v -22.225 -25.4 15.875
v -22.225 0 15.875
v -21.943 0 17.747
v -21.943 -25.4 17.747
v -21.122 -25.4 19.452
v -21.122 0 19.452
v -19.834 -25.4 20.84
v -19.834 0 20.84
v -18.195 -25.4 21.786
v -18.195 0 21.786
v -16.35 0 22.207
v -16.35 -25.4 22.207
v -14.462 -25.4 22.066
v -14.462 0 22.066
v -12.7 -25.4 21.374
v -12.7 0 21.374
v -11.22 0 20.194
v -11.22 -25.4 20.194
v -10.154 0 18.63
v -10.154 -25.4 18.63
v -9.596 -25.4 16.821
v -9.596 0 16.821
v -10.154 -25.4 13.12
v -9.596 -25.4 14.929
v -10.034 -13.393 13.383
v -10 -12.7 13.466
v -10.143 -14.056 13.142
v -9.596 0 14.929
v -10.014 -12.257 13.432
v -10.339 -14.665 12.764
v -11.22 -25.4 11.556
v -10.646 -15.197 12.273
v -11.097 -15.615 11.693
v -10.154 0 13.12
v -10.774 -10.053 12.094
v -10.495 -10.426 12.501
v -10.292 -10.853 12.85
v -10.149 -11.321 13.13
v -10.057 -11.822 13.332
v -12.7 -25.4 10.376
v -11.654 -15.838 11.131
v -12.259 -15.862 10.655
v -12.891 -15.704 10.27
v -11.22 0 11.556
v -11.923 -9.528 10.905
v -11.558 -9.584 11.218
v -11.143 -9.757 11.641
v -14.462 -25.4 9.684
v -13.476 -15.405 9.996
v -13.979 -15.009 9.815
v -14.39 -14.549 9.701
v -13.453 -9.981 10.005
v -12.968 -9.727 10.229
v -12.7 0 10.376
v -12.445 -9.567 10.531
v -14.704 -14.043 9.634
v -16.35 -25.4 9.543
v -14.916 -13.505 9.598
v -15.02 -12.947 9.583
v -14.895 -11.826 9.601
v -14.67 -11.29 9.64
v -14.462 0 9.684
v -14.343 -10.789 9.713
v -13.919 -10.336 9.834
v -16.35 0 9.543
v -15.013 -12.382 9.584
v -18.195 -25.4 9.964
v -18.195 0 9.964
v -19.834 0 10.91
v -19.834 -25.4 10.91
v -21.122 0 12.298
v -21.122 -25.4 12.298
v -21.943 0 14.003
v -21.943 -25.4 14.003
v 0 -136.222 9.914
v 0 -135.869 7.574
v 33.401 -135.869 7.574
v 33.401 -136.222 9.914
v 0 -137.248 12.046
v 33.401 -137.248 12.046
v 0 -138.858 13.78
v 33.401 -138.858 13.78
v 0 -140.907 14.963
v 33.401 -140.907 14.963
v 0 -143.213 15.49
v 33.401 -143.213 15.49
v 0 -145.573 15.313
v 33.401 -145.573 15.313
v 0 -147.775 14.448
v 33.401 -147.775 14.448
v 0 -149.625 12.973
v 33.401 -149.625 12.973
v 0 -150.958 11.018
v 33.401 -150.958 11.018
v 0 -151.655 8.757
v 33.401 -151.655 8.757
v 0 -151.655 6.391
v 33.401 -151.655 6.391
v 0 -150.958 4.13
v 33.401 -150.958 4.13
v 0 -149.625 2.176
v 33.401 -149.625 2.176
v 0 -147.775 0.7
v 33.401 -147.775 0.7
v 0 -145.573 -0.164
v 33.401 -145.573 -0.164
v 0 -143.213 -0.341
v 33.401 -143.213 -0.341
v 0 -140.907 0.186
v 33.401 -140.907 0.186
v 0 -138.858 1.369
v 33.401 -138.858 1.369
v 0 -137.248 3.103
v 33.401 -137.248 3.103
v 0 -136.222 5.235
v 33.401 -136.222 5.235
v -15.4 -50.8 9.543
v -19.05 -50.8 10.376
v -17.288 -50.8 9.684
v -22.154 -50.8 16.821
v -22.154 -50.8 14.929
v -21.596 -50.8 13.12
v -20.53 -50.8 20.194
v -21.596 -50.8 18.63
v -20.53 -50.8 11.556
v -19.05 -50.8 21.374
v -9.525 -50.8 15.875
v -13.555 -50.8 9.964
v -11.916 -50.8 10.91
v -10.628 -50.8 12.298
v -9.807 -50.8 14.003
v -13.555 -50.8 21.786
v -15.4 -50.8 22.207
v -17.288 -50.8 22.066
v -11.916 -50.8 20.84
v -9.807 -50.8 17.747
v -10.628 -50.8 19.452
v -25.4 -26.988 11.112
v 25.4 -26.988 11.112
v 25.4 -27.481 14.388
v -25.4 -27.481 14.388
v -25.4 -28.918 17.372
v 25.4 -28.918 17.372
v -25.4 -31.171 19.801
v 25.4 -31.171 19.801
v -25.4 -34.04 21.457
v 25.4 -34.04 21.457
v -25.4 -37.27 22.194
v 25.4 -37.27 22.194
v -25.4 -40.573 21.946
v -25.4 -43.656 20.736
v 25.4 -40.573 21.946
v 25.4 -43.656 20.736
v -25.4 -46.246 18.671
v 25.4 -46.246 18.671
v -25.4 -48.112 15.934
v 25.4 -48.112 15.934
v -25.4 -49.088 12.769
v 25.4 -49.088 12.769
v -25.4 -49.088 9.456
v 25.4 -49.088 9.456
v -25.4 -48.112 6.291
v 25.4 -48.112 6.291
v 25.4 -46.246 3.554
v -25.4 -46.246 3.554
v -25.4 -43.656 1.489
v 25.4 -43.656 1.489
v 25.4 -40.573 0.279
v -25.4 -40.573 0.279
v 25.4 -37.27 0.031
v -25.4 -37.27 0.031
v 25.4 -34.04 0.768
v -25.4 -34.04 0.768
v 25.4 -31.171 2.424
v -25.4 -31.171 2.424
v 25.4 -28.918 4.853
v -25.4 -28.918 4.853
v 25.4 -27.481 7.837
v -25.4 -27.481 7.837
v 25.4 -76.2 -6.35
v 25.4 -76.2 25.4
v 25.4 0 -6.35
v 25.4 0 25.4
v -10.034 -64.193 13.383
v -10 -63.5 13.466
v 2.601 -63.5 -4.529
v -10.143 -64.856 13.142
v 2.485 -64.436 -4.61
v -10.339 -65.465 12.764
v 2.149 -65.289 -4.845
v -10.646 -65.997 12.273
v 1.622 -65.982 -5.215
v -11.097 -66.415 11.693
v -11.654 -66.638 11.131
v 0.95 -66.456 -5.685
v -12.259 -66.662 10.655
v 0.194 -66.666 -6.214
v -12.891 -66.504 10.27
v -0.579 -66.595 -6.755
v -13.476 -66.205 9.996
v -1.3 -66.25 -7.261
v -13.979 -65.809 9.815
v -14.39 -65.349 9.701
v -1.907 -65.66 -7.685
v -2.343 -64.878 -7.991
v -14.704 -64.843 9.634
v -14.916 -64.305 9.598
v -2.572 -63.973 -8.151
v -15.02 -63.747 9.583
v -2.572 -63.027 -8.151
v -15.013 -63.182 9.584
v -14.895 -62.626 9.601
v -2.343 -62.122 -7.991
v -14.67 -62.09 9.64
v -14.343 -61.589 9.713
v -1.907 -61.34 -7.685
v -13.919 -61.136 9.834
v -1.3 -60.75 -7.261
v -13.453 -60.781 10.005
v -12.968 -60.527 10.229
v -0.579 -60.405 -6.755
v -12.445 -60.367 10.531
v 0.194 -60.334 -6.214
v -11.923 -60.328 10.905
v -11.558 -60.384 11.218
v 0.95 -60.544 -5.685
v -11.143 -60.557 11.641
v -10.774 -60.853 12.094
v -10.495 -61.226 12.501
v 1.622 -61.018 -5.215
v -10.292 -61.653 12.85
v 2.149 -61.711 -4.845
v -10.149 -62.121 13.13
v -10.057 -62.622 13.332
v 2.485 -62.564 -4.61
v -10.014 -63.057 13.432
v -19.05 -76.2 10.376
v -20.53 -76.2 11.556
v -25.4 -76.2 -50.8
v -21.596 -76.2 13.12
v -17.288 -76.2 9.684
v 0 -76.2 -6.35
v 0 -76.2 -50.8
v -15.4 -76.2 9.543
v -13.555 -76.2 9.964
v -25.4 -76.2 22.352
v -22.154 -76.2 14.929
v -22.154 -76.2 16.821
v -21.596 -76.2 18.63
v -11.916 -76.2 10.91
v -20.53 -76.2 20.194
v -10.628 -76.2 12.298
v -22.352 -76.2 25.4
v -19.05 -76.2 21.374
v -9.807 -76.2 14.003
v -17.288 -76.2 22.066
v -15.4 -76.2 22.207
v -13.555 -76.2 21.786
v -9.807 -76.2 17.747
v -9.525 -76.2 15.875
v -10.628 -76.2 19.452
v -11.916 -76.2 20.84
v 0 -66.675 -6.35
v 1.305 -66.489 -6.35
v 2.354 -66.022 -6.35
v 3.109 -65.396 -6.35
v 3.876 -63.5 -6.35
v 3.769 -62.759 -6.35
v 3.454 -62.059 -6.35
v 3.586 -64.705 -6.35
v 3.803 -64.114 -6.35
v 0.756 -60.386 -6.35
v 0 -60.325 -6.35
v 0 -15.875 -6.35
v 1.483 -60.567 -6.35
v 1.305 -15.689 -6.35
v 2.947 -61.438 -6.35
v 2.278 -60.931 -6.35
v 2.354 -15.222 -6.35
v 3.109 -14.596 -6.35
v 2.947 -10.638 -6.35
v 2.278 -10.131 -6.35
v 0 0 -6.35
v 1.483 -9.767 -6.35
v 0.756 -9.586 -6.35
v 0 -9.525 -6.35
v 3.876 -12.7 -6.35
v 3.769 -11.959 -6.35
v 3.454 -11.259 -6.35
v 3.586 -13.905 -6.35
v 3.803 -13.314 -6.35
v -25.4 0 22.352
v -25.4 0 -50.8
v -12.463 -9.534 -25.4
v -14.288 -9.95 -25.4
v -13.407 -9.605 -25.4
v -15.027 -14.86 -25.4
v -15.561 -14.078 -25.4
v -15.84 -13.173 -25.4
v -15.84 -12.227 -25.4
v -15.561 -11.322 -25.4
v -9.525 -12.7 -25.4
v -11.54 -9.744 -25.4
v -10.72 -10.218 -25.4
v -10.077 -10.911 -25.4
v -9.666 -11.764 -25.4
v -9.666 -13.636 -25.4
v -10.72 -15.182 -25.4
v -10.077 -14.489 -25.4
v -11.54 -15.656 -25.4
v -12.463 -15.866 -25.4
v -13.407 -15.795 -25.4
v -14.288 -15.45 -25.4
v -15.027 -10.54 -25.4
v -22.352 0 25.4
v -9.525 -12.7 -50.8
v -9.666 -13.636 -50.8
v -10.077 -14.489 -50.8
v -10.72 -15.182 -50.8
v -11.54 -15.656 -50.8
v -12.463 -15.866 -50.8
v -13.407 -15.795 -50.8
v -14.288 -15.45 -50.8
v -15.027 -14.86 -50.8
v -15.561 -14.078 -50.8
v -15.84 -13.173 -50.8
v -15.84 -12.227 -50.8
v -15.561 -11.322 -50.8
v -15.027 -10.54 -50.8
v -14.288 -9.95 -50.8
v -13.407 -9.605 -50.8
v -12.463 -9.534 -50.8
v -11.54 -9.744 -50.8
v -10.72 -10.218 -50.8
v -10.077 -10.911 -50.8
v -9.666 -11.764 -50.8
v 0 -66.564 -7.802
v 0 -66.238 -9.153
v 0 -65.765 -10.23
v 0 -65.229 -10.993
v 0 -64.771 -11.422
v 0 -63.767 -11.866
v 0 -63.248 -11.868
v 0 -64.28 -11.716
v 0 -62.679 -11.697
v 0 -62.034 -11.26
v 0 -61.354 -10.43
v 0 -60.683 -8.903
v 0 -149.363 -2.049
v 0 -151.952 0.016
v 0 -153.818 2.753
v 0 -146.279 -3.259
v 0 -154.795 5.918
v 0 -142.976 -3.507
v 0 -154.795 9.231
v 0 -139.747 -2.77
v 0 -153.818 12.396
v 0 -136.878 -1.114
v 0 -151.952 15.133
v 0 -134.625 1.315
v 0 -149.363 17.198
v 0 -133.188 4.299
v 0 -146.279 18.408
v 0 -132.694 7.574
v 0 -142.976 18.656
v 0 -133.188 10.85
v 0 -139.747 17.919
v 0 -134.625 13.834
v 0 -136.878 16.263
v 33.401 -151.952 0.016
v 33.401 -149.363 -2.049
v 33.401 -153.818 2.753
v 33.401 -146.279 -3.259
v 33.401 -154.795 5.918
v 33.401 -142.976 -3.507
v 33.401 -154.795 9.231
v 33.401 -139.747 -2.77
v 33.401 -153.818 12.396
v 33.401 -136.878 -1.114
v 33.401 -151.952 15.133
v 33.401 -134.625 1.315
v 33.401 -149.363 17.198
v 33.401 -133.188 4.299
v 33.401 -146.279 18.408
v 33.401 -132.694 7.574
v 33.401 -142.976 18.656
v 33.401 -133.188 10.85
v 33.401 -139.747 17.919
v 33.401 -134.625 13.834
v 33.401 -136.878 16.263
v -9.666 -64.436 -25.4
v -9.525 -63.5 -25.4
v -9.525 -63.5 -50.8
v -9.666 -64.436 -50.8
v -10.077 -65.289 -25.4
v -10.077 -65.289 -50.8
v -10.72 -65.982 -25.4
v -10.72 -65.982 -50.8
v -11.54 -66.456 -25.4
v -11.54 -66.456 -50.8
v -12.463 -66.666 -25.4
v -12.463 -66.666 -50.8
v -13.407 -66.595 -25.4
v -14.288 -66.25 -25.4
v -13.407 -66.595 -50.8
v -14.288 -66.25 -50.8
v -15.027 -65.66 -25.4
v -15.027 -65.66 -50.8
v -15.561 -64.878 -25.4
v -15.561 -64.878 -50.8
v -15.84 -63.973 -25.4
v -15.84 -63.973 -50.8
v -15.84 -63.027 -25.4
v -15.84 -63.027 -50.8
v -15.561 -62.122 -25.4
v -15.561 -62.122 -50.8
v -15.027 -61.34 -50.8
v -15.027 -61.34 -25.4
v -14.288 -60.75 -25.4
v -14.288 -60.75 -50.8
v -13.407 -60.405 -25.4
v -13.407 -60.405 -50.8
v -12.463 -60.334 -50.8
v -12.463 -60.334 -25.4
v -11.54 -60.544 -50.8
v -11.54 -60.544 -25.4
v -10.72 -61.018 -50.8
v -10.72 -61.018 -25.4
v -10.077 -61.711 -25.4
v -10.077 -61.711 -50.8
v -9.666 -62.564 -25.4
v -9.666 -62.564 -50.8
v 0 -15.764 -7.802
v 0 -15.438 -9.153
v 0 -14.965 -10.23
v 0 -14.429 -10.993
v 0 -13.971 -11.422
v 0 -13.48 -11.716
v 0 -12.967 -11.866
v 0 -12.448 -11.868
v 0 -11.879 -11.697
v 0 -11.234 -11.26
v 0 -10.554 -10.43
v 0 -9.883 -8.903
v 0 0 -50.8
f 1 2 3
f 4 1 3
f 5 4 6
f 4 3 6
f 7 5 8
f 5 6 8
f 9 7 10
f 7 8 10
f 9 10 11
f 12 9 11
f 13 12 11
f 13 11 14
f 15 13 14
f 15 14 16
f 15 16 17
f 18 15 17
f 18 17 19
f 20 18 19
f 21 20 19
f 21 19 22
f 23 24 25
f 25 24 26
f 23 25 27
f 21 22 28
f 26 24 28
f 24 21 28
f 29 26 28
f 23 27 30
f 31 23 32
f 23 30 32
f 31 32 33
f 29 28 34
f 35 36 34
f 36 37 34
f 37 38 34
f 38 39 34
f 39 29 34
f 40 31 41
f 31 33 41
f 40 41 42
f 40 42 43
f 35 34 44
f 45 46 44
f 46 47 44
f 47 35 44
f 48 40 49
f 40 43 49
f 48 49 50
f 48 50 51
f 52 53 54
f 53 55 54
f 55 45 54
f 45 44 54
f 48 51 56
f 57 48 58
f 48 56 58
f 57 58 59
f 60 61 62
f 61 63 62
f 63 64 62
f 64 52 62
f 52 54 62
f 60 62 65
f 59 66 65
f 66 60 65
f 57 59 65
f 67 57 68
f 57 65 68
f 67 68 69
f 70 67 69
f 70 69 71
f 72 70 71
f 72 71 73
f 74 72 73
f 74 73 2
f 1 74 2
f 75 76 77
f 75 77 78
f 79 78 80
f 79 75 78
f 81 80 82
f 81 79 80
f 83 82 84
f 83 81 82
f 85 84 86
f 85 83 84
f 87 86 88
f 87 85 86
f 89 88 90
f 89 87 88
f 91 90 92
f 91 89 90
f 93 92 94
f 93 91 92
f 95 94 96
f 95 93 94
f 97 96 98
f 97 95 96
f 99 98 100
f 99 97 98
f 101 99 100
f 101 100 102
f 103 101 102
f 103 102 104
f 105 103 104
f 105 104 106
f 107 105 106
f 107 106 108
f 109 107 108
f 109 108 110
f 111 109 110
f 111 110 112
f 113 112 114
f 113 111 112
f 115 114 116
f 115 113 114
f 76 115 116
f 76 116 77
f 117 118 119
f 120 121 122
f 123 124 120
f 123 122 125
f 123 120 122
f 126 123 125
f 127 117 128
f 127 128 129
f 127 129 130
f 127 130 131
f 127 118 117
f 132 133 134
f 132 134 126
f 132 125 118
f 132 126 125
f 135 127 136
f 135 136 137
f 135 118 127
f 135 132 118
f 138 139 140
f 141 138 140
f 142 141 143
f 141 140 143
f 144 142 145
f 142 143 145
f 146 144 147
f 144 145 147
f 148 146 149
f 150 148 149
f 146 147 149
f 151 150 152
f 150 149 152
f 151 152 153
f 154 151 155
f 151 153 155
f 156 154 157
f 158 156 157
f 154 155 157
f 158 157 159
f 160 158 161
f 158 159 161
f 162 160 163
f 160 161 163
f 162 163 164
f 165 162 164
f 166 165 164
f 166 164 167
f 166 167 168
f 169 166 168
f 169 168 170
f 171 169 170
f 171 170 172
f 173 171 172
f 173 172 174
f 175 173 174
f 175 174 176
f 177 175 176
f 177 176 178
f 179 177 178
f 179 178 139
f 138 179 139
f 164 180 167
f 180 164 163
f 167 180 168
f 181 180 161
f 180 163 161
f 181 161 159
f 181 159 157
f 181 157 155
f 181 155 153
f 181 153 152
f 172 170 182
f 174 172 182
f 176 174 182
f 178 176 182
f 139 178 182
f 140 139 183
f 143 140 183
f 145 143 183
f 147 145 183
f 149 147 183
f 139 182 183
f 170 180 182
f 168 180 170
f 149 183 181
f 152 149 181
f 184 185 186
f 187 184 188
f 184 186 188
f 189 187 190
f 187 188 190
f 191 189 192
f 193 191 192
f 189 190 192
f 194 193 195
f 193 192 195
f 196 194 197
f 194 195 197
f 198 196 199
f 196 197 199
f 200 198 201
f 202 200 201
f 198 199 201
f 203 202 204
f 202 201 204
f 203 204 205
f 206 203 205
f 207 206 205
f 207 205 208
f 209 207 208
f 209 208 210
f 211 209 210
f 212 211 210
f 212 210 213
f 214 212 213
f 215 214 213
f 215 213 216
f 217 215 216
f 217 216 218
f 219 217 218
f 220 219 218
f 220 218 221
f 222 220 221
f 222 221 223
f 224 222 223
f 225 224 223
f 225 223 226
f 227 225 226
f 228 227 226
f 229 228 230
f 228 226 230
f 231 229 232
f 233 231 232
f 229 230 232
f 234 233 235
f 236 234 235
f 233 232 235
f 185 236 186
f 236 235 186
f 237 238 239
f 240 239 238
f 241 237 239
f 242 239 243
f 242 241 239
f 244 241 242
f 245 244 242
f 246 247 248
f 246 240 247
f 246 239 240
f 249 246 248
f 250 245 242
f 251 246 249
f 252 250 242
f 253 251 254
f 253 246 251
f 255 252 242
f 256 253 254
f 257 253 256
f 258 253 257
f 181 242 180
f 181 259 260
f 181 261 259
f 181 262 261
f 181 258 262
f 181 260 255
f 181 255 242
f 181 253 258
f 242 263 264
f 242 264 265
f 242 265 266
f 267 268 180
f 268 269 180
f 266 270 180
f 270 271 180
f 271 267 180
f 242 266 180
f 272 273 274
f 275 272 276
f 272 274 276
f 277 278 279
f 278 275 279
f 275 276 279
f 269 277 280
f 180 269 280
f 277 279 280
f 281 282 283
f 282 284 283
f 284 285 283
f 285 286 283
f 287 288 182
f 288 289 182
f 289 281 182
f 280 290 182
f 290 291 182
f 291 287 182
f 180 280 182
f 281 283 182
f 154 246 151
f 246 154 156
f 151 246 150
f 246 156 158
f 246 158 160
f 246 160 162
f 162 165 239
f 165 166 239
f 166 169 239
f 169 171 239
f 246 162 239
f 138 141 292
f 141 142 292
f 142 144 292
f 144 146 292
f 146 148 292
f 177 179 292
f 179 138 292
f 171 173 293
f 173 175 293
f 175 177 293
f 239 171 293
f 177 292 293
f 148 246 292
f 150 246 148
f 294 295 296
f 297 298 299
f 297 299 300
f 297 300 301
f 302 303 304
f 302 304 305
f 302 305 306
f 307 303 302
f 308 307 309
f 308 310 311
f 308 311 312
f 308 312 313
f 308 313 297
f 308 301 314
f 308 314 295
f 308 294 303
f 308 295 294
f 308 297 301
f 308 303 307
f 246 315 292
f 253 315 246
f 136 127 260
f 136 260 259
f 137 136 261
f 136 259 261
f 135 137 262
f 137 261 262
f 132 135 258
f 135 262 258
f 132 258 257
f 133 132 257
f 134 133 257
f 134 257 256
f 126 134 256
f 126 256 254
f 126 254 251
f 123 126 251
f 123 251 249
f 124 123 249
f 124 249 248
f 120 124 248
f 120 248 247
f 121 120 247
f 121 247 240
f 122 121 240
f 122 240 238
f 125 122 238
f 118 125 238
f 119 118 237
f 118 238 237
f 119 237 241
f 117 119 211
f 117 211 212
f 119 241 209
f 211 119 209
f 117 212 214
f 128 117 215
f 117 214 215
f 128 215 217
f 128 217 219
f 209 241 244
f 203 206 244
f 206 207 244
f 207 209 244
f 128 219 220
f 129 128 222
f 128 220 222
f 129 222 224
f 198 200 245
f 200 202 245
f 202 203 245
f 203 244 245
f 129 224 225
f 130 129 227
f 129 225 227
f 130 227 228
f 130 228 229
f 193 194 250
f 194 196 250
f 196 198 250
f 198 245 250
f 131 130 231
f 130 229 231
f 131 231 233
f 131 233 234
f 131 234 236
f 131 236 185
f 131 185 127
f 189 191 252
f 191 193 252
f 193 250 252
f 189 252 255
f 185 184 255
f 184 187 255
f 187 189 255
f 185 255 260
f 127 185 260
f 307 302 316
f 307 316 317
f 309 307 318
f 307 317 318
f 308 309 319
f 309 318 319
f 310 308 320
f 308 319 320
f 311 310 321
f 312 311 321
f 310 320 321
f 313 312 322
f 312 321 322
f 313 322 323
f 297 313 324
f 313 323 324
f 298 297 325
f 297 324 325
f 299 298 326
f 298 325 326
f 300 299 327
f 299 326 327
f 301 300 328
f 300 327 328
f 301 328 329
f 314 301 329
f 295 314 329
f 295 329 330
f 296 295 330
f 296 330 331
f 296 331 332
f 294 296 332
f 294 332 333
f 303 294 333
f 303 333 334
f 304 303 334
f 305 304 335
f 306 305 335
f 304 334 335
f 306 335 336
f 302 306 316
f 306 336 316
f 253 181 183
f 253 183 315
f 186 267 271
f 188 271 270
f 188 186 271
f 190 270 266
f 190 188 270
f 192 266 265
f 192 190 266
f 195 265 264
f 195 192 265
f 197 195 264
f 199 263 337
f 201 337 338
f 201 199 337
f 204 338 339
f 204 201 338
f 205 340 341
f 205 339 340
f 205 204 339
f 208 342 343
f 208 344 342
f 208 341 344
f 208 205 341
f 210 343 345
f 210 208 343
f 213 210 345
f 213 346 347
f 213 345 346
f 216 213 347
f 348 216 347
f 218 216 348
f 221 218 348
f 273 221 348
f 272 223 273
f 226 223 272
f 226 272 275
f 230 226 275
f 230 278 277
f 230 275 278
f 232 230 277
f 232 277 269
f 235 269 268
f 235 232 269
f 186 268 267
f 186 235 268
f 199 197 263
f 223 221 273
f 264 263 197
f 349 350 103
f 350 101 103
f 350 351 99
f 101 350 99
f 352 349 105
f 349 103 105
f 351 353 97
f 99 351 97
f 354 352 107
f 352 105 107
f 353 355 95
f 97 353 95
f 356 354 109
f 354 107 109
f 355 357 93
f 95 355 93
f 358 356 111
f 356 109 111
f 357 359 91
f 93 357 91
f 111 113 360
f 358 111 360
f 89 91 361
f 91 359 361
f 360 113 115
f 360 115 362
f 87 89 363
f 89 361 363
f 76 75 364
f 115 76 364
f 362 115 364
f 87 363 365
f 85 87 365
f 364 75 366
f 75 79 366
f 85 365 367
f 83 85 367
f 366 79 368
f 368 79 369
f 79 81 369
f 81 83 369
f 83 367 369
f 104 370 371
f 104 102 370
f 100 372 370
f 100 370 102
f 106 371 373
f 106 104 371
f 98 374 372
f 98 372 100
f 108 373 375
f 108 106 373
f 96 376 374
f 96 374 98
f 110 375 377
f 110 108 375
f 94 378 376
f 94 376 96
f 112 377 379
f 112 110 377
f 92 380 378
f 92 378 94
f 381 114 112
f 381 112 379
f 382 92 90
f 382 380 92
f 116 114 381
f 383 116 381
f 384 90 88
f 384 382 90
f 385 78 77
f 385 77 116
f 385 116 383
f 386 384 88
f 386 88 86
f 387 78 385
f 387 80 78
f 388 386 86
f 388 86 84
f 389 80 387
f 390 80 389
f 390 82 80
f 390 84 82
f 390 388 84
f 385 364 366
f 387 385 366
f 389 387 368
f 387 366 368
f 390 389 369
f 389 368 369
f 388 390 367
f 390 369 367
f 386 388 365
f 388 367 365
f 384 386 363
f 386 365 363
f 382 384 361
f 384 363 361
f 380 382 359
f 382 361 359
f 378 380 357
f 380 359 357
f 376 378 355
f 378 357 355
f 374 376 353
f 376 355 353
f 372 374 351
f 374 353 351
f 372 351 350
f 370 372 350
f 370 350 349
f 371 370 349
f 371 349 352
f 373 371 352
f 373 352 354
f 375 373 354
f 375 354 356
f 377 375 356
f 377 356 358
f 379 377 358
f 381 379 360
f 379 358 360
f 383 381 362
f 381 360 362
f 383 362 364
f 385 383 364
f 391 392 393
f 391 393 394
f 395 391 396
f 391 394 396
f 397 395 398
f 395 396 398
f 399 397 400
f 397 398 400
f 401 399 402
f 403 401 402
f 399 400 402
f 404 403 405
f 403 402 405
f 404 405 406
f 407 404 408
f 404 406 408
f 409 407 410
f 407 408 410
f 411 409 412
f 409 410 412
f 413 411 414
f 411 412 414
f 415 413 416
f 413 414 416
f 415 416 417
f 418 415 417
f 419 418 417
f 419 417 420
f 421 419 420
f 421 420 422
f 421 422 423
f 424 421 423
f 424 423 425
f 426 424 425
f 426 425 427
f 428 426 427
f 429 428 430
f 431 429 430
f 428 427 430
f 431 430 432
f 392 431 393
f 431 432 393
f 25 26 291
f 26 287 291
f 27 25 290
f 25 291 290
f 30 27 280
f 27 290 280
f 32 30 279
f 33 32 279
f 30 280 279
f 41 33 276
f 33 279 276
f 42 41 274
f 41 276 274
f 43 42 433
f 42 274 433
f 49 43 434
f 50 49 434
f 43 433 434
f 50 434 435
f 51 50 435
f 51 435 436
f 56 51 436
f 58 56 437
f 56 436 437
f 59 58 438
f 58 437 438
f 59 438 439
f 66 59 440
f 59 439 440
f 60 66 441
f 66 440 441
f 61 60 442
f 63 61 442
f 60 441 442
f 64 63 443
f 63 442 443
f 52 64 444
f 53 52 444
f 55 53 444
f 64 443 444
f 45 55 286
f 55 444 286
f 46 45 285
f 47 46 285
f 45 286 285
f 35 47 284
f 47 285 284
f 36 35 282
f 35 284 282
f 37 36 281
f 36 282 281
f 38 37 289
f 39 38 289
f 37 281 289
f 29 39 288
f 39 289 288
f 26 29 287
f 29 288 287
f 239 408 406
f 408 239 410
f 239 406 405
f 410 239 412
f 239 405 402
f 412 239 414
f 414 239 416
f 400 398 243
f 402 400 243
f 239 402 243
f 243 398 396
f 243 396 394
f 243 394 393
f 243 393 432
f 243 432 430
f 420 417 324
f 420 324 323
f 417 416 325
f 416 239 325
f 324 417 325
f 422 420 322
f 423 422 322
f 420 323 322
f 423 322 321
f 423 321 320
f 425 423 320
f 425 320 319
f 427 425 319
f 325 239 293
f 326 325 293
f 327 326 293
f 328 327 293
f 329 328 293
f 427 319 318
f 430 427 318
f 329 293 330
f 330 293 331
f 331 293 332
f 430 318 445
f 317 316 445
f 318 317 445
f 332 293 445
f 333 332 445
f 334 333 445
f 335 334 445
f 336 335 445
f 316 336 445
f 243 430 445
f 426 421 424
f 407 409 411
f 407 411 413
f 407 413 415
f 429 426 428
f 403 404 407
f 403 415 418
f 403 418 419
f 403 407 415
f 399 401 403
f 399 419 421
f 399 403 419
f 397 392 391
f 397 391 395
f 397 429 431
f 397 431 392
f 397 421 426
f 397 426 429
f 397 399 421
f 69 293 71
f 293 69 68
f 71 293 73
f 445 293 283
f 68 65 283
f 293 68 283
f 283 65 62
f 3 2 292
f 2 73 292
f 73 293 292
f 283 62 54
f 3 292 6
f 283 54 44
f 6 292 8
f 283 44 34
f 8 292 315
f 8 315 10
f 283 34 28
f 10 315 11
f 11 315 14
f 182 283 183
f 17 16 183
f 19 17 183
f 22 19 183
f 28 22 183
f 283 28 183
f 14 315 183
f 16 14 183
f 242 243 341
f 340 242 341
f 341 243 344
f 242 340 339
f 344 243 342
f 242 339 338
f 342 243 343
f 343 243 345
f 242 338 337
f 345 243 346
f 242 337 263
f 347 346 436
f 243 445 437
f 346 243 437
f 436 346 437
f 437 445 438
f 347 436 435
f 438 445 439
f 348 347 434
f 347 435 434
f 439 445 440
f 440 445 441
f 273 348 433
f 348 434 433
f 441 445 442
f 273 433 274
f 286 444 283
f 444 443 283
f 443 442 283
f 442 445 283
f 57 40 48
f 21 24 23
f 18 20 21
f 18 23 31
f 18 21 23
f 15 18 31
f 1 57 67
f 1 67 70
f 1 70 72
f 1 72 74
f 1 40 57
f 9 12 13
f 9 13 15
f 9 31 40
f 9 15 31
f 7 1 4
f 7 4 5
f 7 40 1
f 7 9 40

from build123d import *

# Parameters (mm, degrees)
F0_R      = 6.35
F1_DEPTH  = 76.2
F2_R      = 11.1125
F3_DEPTH  = 50.801
F4_R      = 6.35
F5_DEPTH  = 25.4
F6_R      = 6.35
F7_DEPTH  = 25.4
F8_R      = 3.175
F9_DEPTH  = 25.4
F10_SIZE  = 3.048
F12_R     = 3.175
F13_DEPTH = 25.4
F14_R     = 11.1125
F14_R_2   = 7.9375
F15_DEPTH = 33.401


with BuildPart() as f1:
    # F0 (on Front) → F1 (new body)
    with BuildSketch(Plane.XZ):
        Polygon((-25.4, -50.8), (0, -50.8), (0, -6.35), (25.4, -6.35), (25.4, 25.4), (-25.4, 25.4), align=None)
        with Locations((-15.875, 15.875)):
            Circle(F0_R, mode=Mode.SUBTRACT)
        with Locations((-15.875, 15.875)):
            Circle(F0_R)
    extrude(amount=F1_DEPTH)

    # F2 (on face) → F3 (cut, through all)
    with BuildSketch(Plane.YZ.offset(25.4)):
        with Locations((-38.1, 11.1125)):
            Circle(F2_R)
    extrude(amount=-F3_DEPTH, mode=Mode.SUBTRACT)

    # F4 (on face) → F5 (cut)
    with BuildSketch(Plane.XZ.offset(76.2)):
        with Locations((-15.875, 15.875)):
            Circle(F4_R)
    extrude(amount=-F5_DEPTH, mode=Mode.SUBTRACT)

    # F6 (on face) → F7 (cut)
    with BuildSketch(Plane(origin=(0, 0, 0), x_dir=(-1, 0, 0), z_dir=(0, 1, 0))):
        with Locations((15.875, 15.875)):
            Circle(F6_R)
    extrude(amount=-F7_DEPTH, mode=Mode.SUBTRACT)

    # F8 (on face) → F9 (cut)
    with BuildSketch(Plane(origin=(0, 0, -50.8), x_dir=(1, 0, 0), z_dir=(0, 0, -1))):
        with Locations((-12.7, 63.5)):
            Circle(F8_R)
        with Locations((-12.7, 12.7)):
            Circle(F8_R)
    extrude(amount=-F9_DEPTH, mode=Mode.SUBTRACT)

    # F10
    f10_edges = [f1.edges().sort_by_distance(p)[0] for p in [
        (-25.4, -38.1, 25.4),
    ]]
    chamfer(f10_edges, length=F10_SIZE)

    # F12 (on face) → F13 (cut, symmetric)
    with BuildSketch(Plane(origin=(2.983524, 0, -4.260914), x_dir=(0.819152, 0, 0.573576), z_dir=(0.573576, 0, -0.819152))):
        with Locations((-3.64221, 63.5)):
            Circle(F12_R)
        with Locations((-3.64221, 12.7)):
            Circle(F12_R)
    extrude(amount=F13_DEPTH, both=True, mode=Mode.SUBTRACT)


with BuildPart() as f15:
    # F14 (on Right) → F15 (new body)
    with BuildSketch(Plane.YZ):
        with Locations((-143.806458, 7.574418)):
            Circle(F14_R)
        with Locations((-143.806458, 7.574418)):
            Circle(F14_R_2, mode=Mode.SUBTRACT)
    extrude(amount=F15_DEPTH)


solid = Compound([f1.part, f15.part])
